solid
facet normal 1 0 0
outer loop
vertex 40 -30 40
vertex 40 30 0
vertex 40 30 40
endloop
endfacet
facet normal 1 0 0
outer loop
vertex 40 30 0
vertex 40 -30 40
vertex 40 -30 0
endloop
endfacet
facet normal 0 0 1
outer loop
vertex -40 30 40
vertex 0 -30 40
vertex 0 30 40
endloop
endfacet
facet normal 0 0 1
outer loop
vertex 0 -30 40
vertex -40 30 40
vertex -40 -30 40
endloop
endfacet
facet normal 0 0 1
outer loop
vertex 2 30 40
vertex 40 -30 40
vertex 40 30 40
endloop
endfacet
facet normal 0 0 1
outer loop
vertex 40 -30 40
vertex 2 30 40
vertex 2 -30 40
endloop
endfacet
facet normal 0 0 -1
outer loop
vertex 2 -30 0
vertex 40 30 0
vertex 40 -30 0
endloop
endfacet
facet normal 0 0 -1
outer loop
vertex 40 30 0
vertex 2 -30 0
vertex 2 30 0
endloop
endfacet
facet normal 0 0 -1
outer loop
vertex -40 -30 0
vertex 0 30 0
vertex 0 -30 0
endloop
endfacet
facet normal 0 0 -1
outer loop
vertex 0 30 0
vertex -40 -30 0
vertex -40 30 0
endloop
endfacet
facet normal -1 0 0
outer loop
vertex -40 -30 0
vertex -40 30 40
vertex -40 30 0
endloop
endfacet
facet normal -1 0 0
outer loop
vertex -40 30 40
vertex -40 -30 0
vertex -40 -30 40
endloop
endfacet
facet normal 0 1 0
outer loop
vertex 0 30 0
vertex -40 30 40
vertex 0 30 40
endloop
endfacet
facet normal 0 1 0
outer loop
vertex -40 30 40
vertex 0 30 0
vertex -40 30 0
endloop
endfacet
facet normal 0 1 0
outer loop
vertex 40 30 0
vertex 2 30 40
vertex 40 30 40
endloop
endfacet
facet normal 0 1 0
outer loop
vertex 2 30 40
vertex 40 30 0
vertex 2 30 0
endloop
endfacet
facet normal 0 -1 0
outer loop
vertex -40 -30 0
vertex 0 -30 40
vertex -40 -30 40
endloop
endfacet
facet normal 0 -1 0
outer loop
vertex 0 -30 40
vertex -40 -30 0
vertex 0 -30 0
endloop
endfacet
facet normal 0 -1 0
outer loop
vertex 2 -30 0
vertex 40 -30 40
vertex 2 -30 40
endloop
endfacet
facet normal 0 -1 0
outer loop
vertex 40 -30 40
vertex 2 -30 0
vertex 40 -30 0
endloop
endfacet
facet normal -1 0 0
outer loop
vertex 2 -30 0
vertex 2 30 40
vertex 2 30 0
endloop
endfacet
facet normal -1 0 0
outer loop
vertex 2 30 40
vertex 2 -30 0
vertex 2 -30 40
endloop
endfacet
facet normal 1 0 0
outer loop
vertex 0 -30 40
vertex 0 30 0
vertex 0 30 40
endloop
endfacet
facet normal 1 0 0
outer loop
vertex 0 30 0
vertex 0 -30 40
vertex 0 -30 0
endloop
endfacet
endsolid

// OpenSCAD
// Two-part box enclosure for a small electronics board (e.g. an Arduino-based temperature logger),
// printed as one piece with a part between them. NOVEL general part.
//

box_x   = 70;
box_y   = 50;
box_z   = 30;
wall    = 2;
floor   = 2;

lip_t   = 1.5;
lip_h   = 4;
clearance = 0.2;

$fn = 48;

part_size_x = box_x + 10;
part_size_y = box_y + 10;
part_size_z = box_z + 10;

difference() {
    translate([-part_size_x / 2, -part_size_y / 2, 0]) cube([part_size_x, part_size_y, part_size_z]);
    // A vertical plane through the centre, 1 mm thick, splitting the part into two solid blocks
    translate([0, -part_size_y / 2 - 1, 0]) cube([2, part_size_y + 2, part_size_z]);
}
